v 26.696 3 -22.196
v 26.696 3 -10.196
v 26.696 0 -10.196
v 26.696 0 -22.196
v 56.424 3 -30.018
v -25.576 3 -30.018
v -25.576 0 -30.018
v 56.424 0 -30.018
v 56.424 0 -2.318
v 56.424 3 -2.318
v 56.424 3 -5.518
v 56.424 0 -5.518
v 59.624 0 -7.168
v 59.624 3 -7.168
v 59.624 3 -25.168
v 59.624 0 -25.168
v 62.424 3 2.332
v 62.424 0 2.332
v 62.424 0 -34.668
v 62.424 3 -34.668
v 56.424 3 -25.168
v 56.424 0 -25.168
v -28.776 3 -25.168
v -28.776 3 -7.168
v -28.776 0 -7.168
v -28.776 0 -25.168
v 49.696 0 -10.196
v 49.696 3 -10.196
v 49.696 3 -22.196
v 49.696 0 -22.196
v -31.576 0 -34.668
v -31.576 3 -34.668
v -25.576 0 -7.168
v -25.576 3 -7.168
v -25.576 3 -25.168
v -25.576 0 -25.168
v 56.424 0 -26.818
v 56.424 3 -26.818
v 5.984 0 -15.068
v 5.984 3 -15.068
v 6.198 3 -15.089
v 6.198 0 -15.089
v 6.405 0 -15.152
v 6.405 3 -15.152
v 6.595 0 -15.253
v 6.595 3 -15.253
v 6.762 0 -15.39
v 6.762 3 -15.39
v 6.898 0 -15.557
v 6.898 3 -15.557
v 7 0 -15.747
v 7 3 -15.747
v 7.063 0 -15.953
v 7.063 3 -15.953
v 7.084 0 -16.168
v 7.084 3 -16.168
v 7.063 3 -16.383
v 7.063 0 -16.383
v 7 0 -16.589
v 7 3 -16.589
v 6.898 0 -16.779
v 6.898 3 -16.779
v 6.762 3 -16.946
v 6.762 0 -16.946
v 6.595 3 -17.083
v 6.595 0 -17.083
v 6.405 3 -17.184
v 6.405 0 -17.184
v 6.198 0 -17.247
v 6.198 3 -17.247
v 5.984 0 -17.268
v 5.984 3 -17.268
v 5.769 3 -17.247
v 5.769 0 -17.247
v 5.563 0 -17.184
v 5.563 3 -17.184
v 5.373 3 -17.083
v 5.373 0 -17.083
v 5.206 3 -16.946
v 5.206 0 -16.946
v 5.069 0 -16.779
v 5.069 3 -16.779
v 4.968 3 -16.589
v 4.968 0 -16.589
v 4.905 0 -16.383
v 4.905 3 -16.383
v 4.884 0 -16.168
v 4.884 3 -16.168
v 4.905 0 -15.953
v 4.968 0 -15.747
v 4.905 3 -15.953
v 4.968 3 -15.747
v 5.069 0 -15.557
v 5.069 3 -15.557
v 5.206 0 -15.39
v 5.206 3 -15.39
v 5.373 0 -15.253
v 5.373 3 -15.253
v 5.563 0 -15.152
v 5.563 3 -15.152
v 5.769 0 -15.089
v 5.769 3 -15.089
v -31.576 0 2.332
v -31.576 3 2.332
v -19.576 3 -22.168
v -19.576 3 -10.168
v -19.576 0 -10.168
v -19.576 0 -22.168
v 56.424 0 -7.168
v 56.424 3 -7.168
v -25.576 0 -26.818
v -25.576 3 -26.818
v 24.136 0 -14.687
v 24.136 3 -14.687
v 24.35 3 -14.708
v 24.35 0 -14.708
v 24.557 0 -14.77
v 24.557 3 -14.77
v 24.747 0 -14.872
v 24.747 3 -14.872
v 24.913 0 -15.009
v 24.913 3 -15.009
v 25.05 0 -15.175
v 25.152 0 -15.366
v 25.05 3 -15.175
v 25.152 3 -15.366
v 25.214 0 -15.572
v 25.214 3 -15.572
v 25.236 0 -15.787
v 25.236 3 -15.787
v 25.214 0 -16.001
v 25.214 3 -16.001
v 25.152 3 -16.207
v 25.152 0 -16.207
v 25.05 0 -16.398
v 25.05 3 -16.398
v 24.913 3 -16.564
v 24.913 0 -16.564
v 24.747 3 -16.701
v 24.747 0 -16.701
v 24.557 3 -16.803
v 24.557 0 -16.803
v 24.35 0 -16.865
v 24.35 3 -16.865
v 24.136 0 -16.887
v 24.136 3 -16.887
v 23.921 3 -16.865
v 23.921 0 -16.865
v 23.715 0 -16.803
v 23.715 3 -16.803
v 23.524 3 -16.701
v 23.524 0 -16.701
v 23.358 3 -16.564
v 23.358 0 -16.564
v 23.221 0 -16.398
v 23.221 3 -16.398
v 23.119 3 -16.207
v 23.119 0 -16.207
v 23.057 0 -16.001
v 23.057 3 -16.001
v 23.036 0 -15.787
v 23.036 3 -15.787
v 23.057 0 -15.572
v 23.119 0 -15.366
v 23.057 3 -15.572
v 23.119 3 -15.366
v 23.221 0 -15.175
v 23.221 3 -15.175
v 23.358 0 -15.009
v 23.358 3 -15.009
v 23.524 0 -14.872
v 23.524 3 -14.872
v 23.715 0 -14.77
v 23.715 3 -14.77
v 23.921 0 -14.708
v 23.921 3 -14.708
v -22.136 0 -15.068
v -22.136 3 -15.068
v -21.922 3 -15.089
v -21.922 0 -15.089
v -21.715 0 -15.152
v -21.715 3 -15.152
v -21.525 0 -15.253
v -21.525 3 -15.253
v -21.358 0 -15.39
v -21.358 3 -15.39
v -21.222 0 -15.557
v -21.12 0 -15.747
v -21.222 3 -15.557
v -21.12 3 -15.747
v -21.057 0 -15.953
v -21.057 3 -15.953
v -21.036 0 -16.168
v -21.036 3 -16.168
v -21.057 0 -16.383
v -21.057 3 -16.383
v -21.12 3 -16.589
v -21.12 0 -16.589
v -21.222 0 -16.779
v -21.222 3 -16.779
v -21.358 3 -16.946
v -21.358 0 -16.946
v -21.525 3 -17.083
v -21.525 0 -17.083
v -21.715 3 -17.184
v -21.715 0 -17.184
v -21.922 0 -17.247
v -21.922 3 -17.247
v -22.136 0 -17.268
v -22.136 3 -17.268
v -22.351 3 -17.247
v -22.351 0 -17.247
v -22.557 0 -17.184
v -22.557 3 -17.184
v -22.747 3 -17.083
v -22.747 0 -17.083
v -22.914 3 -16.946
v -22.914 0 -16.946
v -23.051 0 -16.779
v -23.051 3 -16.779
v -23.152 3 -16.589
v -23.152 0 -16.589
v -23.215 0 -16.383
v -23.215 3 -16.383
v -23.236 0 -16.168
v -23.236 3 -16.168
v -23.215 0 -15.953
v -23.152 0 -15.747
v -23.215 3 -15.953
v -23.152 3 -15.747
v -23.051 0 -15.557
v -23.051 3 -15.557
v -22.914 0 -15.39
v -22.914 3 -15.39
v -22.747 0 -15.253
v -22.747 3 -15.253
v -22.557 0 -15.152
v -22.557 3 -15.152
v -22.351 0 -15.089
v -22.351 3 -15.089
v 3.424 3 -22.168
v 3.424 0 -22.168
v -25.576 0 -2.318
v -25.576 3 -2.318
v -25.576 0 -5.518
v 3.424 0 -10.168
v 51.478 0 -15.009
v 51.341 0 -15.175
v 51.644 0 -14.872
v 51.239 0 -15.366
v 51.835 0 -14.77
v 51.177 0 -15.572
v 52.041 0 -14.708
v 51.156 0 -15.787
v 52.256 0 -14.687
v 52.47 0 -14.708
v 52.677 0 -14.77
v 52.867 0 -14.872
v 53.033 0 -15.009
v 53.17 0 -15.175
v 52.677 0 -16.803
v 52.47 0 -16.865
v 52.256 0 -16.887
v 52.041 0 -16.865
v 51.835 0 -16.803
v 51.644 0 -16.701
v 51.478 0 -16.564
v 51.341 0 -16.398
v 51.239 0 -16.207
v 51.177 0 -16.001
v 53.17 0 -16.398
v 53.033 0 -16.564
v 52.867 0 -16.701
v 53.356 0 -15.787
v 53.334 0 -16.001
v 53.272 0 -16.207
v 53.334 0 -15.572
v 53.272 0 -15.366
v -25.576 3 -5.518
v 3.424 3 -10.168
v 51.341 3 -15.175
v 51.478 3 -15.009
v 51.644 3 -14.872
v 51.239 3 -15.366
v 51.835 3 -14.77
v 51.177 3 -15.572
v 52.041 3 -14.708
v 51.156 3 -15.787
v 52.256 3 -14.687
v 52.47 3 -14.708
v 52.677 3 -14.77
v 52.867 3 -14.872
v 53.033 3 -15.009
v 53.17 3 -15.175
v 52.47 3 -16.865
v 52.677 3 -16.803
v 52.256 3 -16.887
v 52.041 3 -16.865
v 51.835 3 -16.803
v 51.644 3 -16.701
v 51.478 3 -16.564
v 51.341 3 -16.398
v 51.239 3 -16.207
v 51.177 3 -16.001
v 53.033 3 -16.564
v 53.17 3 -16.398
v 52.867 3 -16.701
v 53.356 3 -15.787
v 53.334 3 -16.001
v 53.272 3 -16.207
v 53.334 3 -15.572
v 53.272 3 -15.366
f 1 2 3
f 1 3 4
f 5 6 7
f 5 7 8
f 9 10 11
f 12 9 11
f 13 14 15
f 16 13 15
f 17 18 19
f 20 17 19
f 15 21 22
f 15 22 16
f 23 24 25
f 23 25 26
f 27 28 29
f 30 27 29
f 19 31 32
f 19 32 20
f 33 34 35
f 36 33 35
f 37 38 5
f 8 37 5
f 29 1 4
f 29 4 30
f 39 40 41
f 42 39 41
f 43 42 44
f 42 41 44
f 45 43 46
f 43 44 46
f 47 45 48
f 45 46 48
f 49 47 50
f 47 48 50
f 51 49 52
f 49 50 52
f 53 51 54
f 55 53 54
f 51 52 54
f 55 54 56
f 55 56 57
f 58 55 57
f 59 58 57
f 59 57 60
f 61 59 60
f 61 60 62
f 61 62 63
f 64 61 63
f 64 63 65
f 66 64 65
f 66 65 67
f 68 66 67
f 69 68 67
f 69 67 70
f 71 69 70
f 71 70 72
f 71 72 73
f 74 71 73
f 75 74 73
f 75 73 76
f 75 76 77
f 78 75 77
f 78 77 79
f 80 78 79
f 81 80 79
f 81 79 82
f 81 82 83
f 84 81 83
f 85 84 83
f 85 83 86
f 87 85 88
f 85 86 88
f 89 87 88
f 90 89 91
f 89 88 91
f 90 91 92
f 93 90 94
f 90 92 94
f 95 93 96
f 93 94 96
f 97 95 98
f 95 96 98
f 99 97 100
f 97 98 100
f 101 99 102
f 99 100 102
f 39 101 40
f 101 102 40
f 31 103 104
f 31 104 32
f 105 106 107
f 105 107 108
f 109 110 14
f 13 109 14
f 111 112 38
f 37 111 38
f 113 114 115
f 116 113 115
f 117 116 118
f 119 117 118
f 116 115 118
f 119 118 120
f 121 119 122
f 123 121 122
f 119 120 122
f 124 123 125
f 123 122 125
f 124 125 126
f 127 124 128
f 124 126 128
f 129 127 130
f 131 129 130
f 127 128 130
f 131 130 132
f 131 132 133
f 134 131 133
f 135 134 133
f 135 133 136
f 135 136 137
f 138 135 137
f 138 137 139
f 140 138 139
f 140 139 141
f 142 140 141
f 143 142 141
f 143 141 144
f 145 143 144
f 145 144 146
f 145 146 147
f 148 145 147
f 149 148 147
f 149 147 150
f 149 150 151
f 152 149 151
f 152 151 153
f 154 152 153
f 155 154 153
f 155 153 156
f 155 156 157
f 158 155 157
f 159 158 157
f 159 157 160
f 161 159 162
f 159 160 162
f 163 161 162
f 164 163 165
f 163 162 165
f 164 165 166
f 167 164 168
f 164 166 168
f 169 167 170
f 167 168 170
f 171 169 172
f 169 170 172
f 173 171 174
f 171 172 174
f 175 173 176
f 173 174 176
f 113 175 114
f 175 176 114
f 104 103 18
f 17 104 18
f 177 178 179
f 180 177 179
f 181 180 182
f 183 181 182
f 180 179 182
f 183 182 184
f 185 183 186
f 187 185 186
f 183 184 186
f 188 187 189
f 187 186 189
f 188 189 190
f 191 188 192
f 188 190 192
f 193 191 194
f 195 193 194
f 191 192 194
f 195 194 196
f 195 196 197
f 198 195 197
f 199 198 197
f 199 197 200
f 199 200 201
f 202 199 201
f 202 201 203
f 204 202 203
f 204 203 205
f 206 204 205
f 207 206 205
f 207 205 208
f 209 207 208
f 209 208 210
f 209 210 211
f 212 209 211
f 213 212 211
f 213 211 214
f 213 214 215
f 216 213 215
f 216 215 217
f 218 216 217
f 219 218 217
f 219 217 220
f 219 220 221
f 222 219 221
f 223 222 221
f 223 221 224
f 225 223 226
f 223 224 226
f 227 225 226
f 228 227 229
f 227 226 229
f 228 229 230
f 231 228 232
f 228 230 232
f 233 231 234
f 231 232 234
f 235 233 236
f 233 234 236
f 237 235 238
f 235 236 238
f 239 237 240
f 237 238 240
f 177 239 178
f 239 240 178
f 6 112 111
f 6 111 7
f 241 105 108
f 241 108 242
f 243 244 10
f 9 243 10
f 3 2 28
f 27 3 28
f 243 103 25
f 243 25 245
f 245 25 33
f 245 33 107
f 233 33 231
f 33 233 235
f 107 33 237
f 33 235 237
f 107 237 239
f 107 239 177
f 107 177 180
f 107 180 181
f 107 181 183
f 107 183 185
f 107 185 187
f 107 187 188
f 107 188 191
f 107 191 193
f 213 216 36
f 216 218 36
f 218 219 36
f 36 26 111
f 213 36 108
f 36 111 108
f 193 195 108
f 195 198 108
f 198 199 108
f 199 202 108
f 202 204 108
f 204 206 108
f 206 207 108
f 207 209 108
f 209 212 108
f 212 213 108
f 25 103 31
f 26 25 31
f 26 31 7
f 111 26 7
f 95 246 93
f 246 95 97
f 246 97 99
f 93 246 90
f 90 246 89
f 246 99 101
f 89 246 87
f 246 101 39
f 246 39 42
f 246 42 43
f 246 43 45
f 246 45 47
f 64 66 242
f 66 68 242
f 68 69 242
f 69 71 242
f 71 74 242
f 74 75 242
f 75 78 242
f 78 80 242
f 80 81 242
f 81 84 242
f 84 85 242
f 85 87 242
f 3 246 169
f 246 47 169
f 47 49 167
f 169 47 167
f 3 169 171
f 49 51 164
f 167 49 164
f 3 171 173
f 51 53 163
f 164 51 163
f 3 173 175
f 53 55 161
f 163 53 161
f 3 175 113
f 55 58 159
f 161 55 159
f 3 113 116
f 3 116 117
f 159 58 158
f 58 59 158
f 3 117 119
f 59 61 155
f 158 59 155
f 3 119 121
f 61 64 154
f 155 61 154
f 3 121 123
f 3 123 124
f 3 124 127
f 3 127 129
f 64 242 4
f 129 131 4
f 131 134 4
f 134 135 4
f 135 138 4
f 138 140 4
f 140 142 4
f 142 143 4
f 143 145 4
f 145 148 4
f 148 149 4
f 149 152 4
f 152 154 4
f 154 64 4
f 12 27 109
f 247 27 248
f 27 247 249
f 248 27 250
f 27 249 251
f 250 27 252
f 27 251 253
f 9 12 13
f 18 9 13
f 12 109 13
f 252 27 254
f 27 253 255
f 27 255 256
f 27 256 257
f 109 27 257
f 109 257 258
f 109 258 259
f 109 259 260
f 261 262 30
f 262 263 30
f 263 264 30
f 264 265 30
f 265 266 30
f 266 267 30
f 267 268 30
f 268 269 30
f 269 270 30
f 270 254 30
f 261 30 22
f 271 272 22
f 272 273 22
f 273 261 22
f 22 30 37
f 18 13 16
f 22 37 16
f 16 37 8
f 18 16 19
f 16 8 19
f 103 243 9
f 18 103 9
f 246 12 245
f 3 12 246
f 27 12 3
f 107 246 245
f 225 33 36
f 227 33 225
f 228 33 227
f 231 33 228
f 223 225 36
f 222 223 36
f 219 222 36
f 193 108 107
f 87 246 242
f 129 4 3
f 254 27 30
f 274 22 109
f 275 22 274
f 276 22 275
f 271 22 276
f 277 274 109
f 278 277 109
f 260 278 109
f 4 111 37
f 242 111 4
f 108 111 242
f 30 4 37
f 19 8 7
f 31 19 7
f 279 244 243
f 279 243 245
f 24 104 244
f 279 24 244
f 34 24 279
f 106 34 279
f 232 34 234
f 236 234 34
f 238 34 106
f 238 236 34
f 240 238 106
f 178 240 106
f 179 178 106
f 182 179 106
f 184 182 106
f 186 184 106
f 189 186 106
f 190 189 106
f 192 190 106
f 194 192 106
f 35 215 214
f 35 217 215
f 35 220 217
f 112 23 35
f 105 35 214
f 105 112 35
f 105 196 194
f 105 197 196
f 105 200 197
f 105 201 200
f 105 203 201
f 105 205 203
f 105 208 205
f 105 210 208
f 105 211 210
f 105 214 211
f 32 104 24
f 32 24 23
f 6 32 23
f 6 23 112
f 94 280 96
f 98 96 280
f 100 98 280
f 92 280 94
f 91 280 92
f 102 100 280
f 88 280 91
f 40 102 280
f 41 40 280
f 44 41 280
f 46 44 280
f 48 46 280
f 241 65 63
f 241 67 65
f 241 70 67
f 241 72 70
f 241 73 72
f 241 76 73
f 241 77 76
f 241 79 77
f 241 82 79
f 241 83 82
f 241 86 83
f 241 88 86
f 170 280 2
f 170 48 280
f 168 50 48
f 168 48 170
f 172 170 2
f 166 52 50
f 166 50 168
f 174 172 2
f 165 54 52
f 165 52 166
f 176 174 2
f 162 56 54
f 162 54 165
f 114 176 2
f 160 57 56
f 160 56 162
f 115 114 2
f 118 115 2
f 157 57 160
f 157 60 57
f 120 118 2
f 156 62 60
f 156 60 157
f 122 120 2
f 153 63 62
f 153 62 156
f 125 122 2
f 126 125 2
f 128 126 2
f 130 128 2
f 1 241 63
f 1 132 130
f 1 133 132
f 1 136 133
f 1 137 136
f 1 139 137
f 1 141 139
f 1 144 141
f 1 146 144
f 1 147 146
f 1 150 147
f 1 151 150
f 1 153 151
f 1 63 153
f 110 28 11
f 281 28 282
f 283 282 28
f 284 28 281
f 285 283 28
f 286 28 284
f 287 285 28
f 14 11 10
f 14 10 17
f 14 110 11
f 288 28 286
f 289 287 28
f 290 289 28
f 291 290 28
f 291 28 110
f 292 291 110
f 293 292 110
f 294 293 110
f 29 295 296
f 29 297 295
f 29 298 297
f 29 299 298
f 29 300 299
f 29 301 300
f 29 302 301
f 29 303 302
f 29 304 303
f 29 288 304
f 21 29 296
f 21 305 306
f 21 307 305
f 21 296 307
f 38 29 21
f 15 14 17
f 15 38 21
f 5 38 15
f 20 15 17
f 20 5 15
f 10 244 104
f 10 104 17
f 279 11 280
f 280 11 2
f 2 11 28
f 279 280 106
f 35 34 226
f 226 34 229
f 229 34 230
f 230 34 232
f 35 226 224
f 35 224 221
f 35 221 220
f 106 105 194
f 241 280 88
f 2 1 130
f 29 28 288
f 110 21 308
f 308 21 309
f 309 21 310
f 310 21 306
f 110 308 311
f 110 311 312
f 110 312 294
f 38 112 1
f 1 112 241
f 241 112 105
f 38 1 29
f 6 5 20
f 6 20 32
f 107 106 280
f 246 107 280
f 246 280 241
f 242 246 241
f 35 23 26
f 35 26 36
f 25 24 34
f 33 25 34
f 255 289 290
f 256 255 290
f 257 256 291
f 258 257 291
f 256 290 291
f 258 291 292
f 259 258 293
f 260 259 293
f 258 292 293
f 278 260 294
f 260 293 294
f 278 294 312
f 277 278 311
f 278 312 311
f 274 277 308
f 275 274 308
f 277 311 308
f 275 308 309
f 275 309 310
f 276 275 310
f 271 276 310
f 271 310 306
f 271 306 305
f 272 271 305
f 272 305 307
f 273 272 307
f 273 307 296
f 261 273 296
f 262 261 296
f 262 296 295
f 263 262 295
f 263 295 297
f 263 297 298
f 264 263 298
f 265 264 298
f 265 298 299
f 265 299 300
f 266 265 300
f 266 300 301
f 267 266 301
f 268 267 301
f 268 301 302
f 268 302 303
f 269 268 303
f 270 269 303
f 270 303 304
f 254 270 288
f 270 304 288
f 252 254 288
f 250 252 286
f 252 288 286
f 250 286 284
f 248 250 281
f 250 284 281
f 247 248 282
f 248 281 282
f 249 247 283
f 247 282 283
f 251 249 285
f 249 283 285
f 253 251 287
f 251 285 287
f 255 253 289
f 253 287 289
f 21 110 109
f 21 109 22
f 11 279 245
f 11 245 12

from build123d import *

# Parameters (mm, degrees)
ESBO_O1_W                = 94
ESBO_O1_H                = 37
RESSALTO_EXTRUS_O1_DEPTH = 3
ESBO_O2_W                = 82
ESBO_O2_H                = 3.2
ESBO_O2_W_2              = 3.2
ESBO_O2_H_2              = 18
CORTE_EXTRUS_O2_DEPTH    = 3
ESBO_O2_5_R              = 1.1
ESBO_O2_5_W              = 82
ESBO_O2_5_H              = 3.2
ESBO_O2_5_W_2            = 3.2
ESBO_O2_5_H_2            = 18
ESBO_O2_5_W_3            = 23
ESBO_O2_5_H_3            = 12
CORTE_EXTRUS_O4_DEPTH    = 10


with BuildPart() as part:
    # Esboço1 → Ressalto-extrusão1 (new body)
    with BuildSketch(Plane(origin=(0, 0, 0), x_dir=(1, 0, 0), z_dir=(0, 1, 0))):
        with Locations((15.423867314, 16.168005002)):
            Rectangle(ESBO_O1_W, ESBO_O1_H)
    extrude(amount=RESSALTO_EXTRUS_O1_DEPTH)

    # Esboço2 → Corte-extrusão2 (cut)
    with BuildSketch(Plane(origin=(0, 3, 0), x_dir=(1, 0, 0), z_dir=(0, 1, 0))):
        with Locations((15.423867314, 3.918005002)):
            Rectangle(ESBO_O2_W, ESBO_O2_H)
        with Locations((15.423867314, 28.418005002)):
            Rectangle(ESBO_O2_W, ESBO_O2_H)
        with Locations((-27.176132686, 16.168005002)):
            Rectangle(ESBO_O2_W_2, ESBO_O2_H_2)
    extrude(amount=-CORTE_EXTRUS_O2_DEPTH, mode=Mode.SUBTRACT)

    # Esboço2<5> → Corte-extrusão4 (cut)
    with BuildSketch(Plane(origin=(0, 3, 0), x_dir=(1, 0, 0), z_dir=(0, 1, 0))):
        with Locations((5.983867314, 16.168005002)):
            Circle(ESBO_O2_5_R)
        with Locations((-22.136132686, 16.168005002)):
            Circle(ESBO_O2_5_R)
        with Locations((52.25559416, 15.786516757)):
            Circle(ESBO_O2_5_R)
        with Locations((24.13559416, 15.786516757)):
            Circle(ESBO_O2_5_R)
        with Locations((15.423867314, 3.918005002)):
            Rectangle(ESBO_O2_5_W, ESBO_O2_5_H)
        with Locations((15.423867314, 28.418005002)):
            Rectangle(ESBO_O2_5_W, ESBO_O2_5_H)
        with Locations((-27.176132686, 16.168005002)):
            Rectangle(ESBO_O2_5_W_2, ESBO_O2_5_H_2)
        with Locations((-8.076132686, 16.168005002)):
            Rectangle(ESBO_O2_5_W_3, ESBO_O2_5_H_3)
        with Locations((58.023867314, 16.168005002)):
            Rectangle(ESBO_O2_5_W_2, ESBO_O2_5_H_2)
        with Locations((38.19559416, 16.196023894)):
            Rectangle(ESBO_O2_5_W_3, ESBO_O2_5_H_3)
    extrude(amount=-CORTE_EXTRUS_O4_DEPTH, mode=Mode.SUBTRACT)


solid = part.part
